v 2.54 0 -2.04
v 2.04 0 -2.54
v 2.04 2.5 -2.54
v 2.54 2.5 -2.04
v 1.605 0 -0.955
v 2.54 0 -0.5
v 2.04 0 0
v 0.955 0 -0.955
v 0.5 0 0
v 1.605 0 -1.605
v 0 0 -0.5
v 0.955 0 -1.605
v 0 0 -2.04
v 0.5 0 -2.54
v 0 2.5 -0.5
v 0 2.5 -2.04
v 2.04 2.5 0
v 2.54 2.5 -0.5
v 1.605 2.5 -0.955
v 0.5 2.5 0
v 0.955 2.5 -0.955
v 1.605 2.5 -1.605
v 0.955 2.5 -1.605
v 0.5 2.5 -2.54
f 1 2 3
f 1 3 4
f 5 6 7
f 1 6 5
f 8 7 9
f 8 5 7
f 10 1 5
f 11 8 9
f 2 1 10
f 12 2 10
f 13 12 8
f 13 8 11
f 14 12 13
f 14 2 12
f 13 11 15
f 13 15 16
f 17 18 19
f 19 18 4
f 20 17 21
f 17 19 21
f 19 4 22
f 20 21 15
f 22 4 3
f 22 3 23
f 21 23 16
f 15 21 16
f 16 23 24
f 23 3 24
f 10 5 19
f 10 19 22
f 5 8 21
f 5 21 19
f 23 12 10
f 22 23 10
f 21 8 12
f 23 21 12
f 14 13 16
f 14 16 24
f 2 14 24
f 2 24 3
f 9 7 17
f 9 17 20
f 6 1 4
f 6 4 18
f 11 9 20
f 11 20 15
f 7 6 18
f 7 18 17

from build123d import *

# Parameters (mm, degrees)
SKETCH1_W           = 0.65
SKETCH1_H           = 0.65
BOSS_EXTRUDE1_DEPTH = 2.5


with BuildPart() as part:
    # Sketch1 → Boss-Extrude1 (new body)
    with BuildSketch(Plane(origin=(0, 0, 0), x_dir=(1, 0, 0), z_dir=(0, 1, 0))):
        Polygon((0, 2.04), (0.5, 2.54), (2.04, 2.54), (2.54, 2.04), (2.54, 0.5), (2.04, 0), (0.5, 0), (0, 0.5), align=None)
        with Locations((1.28, 1.28)):
            Rectangle(SKETCH1_W, SKETCH1_H, mode=Mode.SUBTRACT)
    extrude(amount=BOSS_EXTRUDE1_DEPTH)


solid = part.part
